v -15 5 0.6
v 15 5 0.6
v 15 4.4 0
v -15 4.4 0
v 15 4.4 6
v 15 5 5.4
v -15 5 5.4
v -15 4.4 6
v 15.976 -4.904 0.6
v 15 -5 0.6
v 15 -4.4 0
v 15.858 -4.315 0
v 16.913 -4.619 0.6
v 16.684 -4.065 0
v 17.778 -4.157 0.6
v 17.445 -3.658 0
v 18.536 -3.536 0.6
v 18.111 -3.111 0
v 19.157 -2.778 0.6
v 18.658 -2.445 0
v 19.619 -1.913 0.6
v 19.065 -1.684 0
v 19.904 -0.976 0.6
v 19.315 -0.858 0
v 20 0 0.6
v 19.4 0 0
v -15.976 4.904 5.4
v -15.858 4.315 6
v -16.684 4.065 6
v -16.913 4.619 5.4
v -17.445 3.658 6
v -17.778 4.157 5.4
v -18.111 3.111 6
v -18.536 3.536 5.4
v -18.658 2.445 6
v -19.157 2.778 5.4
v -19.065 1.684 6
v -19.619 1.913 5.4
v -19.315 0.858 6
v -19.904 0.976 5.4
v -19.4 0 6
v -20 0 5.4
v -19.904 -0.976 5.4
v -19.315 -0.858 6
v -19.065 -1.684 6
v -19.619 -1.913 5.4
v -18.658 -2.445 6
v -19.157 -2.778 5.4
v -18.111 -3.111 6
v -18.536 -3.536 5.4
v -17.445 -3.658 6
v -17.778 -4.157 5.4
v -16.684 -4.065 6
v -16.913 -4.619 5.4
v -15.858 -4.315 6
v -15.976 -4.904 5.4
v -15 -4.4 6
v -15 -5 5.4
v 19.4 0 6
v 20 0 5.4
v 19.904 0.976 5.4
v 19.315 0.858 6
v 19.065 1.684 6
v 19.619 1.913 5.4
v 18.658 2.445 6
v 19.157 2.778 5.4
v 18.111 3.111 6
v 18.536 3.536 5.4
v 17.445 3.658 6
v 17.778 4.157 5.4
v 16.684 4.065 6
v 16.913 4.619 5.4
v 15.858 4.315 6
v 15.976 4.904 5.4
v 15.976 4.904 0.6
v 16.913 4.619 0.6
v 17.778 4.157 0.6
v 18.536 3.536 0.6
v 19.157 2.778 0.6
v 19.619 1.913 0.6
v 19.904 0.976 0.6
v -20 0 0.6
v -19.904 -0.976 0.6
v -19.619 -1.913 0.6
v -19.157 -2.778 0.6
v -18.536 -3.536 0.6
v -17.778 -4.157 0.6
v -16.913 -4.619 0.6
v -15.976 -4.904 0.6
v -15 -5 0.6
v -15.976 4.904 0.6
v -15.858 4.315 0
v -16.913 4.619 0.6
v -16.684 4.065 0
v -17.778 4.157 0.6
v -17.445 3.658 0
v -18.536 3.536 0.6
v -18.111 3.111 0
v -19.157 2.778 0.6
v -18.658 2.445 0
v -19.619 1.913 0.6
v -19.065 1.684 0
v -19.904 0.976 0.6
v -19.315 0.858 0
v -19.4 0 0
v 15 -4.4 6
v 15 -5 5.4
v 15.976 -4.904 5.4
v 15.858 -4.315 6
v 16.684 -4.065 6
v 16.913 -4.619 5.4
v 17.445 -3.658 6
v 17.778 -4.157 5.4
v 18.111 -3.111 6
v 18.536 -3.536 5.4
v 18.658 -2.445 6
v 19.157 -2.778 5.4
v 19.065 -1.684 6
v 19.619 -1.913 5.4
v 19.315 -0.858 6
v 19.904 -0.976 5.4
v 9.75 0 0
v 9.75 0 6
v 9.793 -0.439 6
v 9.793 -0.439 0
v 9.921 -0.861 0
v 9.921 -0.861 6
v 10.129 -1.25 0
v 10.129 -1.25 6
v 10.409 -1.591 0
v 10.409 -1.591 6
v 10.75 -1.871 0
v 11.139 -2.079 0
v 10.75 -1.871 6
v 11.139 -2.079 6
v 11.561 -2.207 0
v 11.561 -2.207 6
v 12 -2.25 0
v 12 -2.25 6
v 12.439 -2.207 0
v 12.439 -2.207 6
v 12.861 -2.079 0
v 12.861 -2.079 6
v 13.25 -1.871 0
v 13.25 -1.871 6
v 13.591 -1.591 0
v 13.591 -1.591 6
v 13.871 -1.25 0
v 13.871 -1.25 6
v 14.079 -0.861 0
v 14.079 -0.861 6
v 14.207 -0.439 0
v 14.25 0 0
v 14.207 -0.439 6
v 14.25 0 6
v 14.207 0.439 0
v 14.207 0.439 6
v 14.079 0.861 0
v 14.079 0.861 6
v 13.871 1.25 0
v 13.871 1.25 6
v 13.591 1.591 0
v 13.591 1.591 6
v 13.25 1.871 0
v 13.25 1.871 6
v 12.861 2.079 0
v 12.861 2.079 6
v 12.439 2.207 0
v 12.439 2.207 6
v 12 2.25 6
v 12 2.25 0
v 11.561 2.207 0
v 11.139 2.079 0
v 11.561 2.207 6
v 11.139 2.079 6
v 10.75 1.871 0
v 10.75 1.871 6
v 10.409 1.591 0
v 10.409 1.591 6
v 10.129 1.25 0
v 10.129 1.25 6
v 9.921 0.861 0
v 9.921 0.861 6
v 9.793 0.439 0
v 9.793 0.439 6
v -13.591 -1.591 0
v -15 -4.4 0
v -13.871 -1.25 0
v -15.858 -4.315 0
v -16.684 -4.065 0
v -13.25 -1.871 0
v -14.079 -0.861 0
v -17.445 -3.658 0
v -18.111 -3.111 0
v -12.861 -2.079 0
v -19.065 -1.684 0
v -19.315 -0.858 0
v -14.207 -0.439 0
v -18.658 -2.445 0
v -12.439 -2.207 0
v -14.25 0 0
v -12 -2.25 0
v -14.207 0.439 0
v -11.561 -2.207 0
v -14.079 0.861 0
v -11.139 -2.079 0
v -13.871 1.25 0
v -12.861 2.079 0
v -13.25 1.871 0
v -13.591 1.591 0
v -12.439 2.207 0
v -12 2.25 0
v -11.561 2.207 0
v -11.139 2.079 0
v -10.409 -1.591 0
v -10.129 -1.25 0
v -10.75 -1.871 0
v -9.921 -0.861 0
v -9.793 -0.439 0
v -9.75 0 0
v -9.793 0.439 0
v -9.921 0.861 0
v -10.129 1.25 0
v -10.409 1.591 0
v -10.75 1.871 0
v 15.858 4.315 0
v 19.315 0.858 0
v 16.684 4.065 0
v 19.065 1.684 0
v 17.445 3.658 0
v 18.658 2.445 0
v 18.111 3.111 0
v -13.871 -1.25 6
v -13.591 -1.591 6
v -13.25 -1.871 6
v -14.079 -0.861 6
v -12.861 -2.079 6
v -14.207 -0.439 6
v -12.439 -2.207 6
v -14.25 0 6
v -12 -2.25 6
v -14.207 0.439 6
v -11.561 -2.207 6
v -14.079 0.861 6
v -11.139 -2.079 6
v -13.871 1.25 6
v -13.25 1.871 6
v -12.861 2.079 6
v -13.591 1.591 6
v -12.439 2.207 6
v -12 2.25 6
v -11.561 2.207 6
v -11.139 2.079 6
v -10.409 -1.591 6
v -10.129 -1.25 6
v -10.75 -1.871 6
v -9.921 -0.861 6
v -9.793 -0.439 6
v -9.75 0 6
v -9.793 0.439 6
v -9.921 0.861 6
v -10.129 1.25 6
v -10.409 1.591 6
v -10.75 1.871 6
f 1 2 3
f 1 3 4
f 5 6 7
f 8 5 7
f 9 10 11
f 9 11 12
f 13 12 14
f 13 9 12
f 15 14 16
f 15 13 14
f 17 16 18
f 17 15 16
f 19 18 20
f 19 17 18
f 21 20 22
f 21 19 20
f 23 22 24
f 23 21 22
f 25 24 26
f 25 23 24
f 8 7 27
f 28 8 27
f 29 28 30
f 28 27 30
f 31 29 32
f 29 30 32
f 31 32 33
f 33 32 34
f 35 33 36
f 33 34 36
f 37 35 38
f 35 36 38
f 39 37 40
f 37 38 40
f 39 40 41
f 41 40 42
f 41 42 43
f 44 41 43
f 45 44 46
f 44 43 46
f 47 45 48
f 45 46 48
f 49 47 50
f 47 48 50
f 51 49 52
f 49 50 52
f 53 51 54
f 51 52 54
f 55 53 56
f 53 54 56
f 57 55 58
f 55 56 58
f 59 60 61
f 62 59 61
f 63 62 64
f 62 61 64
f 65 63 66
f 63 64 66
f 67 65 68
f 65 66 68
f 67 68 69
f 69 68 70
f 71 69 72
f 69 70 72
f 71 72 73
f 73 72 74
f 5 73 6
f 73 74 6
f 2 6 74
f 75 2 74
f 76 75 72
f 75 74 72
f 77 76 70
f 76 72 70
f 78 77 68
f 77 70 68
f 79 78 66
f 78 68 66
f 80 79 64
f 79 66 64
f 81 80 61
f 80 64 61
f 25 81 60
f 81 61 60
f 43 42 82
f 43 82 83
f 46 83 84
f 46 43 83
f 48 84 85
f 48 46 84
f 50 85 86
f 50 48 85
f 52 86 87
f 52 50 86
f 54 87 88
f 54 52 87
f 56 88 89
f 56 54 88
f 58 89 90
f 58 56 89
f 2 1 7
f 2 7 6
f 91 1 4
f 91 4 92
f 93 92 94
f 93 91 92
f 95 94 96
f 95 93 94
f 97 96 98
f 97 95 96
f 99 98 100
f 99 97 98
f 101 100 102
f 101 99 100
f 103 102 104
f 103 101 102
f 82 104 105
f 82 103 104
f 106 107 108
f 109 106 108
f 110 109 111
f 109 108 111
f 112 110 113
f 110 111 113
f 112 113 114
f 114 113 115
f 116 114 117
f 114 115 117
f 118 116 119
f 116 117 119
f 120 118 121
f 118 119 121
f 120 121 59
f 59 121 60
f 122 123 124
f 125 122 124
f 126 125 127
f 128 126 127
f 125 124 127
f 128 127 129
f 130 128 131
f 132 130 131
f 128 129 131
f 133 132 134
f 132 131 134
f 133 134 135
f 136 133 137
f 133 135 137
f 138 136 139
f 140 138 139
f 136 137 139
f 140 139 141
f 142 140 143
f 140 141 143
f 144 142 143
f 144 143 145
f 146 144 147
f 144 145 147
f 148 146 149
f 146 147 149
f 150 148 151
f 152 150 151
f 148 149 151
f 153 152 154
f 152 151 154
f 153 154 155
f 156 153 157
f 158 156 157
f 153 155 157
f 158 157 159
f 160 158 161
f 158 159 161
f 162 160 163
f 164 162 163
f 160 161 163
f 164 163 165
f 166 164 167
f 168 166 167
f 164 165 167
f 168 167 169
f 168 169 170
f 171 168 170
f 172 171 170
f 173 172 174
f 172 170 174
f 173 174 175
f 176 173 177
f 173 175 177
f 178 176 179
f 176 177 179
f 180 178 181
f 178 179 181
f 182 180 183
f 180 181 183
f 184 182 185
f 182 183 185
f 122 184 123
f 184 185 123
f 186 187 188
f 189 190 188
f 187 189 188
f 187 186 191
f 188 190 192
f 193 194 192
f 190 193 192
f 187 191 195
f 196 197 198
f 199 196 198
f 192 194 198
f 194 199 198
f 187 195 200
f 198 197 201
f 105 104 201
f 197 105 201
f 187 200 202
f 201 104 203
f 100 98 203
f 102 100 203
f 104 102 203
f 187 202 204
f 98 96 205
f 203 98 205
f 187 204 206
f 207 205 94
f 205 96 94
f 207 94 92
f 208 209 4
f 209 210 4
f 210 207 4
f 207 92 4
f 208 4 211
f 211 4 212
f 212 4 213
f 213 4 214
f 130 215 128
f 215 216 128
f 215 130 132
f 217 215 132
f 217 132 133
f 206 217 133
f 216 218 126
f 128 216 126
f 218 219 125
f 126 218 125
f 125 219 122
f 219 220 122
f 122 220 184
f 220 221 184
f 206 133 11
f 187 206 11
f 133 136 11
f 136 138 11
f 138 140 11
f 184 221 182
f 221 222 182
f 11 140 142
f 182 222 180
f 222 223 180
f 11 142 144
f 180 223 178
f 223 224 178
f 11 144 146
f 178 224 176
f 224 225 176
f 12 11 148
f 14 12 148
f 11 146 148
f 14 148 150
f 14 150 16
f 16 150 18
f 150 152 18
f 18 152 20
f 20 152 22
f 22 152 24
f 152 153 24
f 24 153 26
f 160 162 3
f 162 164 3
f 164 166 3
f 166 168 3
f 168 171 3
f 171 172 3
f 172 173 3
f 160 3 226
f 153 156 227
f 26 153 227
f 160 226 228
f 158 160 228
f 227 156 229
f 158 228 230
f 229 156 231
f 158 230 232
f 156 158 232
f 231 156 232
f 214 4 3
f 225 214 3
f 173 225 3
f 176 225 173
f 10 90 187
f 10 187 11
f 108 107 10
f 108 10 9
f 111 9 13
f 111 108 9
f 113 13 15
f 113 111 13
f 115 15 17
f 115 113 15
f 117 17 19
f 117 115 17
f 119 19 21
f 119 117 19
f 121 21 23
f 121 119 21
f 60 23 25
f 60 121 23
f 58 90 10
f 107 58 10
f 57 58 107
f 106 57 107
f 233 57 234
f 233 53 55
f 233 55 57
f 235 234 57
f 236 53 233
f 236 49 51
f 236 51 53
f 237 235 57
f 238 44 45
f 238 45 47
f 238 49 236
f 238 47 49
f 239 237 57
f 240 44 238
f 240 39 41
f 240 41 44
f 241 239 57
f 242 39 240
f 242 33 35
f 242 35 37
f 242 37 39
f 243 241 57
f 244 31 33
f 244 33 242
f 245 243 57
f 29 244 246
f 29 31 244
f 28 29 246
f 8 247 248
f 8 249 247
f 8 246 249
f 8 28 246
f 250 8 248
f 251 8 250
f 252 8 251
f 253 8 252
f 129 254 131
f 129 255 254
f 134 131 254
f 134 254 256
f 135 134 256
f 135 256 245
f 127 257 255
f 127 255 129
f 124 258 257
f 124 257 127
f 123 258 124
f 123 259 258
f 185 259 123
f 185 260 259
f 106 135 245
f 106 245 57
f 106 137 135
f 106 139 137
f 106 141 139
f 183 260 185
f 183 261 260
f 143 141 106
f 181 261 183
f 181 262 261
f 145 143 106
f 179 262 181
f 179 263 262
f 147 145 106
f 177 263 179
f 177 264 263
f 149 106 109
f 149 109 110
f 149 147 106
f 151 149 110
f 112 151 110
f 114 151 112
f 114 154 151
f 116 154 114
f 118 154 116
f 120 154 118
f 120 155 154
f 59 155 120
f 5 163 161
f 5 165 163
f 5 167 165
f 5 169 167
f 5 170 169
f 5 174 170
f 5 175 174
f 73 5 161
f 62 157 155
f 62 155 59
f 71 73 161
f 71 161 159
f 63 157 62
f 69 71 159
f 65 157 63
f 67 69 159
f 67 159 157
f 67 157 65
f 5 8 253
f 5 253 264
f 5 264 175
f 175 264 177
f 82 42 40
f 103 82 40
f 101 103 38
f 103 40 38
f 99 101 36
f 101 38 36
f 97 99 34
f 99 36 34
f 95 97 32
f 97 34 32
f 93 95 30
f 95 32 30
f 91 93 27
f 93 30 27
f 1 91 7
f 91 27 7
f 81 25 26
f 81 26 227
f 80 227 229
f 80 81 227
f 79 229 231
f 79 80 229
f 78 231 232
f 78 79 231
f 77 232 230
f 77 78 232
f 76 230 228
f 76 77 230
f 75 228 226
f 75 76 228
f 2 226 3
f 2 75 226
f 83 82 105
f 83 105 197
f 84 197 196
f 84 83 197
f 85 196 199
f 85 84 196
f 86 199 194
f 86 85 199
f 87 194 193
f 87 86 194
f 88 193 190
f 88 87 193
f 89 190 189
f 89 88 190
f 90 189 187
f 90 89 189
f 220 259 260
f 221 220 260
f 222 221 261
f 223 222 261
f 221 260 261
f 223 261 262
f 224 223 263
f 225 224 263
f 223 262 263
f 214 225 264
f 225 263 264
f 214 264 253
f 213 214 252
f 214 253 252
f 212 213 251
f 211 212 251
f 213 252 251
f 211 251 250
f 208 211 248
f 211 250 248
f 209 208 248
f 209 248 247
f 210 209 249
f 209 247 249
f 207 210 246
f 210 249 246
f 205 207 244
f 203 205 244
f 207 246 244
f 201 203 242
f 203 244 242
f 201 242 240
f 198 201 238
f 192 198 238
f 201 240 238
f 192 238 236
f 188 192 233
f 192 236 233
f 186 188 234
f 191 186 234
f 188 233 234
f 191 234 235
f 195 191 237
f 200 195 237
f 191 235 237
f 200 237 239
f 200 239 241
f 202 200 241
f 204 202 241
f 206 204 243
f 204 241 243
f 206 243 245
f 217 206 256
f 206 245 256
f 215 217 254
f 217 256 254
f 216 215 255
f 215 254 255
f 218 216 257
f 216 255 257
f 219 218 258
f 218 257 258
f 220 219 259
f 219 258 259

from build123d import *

# Parameters (mm, degrees)
SKETCH1_W           = 40
SKETCH1_H           = 10
BOSS_EXTRUDE1_DEPTH = 6
SKETCH2_R           = 2.25
CUT_EXTRUDE1_DEPTH  = 6
FILLET1_R           = 5
CHAMFER1_SIZE       = 0.6


with BuildPart() as part:
    # Sketch1 → Boss-Extrude1 (new body)
    with BuildSketch(Plane.XY):
        Rectangle(SKETCH1_W, SKETCH1_H)
    extrude(amount=BOSS_EXTRUDE1_DEPTH)

    # Sketch2 → Cut-Extrude1 (cut)
    with BuildSketch(Plane.XY.offset(6)):
        with Locations((-12, 0)):
            Circle(SKETCH2_R)
        with Locations(Location((12, 0, 0), (0, 0, 180))):
            Circle(SKETCH2_R)
    extrude(amount=-CUT_EXTRUDE1_DEPTH, mode=Mode.SUBTRACT)

    # Fillet1
    fillet1_edges = [part.edges().sort_by_distance(p)[0] for p in [
        (20, -5, 3),
        (20, 5, 3),
        (-20, -5, 3),
        (-20, 5, 3),
    ]]
    fillet(fillet1_edges, radius=FILLET1_R - 0.0001)  # a hair under: the kernel refuses the full size

    # Chamfer1
    chamfer1_edges = [part.edges().sort_by_distance(p)[0] for p in [
        (0, -5, 0),
        (0, 5, 0),
        (-18.535563195, 3.535563195, 0),
        (-18.535563195, -3.535563195, 0),
        (18.535563195, 3.535563195, 0),
        (18.535563195, -3.535563195, 0),
        (0, -5, 6),
        (0, 5, 6),
        (-18.535563195, 3.535563195, 6),
        (-18.535563195, -3.535563195, 6),
        (18.535563195, 3.535563195, 6),
        (18.535563195, -3.535563195, 6),
    ]]
    chamfer(chamfer1_edges, length=CHAMFER1_SIZE)


solid = part.part
